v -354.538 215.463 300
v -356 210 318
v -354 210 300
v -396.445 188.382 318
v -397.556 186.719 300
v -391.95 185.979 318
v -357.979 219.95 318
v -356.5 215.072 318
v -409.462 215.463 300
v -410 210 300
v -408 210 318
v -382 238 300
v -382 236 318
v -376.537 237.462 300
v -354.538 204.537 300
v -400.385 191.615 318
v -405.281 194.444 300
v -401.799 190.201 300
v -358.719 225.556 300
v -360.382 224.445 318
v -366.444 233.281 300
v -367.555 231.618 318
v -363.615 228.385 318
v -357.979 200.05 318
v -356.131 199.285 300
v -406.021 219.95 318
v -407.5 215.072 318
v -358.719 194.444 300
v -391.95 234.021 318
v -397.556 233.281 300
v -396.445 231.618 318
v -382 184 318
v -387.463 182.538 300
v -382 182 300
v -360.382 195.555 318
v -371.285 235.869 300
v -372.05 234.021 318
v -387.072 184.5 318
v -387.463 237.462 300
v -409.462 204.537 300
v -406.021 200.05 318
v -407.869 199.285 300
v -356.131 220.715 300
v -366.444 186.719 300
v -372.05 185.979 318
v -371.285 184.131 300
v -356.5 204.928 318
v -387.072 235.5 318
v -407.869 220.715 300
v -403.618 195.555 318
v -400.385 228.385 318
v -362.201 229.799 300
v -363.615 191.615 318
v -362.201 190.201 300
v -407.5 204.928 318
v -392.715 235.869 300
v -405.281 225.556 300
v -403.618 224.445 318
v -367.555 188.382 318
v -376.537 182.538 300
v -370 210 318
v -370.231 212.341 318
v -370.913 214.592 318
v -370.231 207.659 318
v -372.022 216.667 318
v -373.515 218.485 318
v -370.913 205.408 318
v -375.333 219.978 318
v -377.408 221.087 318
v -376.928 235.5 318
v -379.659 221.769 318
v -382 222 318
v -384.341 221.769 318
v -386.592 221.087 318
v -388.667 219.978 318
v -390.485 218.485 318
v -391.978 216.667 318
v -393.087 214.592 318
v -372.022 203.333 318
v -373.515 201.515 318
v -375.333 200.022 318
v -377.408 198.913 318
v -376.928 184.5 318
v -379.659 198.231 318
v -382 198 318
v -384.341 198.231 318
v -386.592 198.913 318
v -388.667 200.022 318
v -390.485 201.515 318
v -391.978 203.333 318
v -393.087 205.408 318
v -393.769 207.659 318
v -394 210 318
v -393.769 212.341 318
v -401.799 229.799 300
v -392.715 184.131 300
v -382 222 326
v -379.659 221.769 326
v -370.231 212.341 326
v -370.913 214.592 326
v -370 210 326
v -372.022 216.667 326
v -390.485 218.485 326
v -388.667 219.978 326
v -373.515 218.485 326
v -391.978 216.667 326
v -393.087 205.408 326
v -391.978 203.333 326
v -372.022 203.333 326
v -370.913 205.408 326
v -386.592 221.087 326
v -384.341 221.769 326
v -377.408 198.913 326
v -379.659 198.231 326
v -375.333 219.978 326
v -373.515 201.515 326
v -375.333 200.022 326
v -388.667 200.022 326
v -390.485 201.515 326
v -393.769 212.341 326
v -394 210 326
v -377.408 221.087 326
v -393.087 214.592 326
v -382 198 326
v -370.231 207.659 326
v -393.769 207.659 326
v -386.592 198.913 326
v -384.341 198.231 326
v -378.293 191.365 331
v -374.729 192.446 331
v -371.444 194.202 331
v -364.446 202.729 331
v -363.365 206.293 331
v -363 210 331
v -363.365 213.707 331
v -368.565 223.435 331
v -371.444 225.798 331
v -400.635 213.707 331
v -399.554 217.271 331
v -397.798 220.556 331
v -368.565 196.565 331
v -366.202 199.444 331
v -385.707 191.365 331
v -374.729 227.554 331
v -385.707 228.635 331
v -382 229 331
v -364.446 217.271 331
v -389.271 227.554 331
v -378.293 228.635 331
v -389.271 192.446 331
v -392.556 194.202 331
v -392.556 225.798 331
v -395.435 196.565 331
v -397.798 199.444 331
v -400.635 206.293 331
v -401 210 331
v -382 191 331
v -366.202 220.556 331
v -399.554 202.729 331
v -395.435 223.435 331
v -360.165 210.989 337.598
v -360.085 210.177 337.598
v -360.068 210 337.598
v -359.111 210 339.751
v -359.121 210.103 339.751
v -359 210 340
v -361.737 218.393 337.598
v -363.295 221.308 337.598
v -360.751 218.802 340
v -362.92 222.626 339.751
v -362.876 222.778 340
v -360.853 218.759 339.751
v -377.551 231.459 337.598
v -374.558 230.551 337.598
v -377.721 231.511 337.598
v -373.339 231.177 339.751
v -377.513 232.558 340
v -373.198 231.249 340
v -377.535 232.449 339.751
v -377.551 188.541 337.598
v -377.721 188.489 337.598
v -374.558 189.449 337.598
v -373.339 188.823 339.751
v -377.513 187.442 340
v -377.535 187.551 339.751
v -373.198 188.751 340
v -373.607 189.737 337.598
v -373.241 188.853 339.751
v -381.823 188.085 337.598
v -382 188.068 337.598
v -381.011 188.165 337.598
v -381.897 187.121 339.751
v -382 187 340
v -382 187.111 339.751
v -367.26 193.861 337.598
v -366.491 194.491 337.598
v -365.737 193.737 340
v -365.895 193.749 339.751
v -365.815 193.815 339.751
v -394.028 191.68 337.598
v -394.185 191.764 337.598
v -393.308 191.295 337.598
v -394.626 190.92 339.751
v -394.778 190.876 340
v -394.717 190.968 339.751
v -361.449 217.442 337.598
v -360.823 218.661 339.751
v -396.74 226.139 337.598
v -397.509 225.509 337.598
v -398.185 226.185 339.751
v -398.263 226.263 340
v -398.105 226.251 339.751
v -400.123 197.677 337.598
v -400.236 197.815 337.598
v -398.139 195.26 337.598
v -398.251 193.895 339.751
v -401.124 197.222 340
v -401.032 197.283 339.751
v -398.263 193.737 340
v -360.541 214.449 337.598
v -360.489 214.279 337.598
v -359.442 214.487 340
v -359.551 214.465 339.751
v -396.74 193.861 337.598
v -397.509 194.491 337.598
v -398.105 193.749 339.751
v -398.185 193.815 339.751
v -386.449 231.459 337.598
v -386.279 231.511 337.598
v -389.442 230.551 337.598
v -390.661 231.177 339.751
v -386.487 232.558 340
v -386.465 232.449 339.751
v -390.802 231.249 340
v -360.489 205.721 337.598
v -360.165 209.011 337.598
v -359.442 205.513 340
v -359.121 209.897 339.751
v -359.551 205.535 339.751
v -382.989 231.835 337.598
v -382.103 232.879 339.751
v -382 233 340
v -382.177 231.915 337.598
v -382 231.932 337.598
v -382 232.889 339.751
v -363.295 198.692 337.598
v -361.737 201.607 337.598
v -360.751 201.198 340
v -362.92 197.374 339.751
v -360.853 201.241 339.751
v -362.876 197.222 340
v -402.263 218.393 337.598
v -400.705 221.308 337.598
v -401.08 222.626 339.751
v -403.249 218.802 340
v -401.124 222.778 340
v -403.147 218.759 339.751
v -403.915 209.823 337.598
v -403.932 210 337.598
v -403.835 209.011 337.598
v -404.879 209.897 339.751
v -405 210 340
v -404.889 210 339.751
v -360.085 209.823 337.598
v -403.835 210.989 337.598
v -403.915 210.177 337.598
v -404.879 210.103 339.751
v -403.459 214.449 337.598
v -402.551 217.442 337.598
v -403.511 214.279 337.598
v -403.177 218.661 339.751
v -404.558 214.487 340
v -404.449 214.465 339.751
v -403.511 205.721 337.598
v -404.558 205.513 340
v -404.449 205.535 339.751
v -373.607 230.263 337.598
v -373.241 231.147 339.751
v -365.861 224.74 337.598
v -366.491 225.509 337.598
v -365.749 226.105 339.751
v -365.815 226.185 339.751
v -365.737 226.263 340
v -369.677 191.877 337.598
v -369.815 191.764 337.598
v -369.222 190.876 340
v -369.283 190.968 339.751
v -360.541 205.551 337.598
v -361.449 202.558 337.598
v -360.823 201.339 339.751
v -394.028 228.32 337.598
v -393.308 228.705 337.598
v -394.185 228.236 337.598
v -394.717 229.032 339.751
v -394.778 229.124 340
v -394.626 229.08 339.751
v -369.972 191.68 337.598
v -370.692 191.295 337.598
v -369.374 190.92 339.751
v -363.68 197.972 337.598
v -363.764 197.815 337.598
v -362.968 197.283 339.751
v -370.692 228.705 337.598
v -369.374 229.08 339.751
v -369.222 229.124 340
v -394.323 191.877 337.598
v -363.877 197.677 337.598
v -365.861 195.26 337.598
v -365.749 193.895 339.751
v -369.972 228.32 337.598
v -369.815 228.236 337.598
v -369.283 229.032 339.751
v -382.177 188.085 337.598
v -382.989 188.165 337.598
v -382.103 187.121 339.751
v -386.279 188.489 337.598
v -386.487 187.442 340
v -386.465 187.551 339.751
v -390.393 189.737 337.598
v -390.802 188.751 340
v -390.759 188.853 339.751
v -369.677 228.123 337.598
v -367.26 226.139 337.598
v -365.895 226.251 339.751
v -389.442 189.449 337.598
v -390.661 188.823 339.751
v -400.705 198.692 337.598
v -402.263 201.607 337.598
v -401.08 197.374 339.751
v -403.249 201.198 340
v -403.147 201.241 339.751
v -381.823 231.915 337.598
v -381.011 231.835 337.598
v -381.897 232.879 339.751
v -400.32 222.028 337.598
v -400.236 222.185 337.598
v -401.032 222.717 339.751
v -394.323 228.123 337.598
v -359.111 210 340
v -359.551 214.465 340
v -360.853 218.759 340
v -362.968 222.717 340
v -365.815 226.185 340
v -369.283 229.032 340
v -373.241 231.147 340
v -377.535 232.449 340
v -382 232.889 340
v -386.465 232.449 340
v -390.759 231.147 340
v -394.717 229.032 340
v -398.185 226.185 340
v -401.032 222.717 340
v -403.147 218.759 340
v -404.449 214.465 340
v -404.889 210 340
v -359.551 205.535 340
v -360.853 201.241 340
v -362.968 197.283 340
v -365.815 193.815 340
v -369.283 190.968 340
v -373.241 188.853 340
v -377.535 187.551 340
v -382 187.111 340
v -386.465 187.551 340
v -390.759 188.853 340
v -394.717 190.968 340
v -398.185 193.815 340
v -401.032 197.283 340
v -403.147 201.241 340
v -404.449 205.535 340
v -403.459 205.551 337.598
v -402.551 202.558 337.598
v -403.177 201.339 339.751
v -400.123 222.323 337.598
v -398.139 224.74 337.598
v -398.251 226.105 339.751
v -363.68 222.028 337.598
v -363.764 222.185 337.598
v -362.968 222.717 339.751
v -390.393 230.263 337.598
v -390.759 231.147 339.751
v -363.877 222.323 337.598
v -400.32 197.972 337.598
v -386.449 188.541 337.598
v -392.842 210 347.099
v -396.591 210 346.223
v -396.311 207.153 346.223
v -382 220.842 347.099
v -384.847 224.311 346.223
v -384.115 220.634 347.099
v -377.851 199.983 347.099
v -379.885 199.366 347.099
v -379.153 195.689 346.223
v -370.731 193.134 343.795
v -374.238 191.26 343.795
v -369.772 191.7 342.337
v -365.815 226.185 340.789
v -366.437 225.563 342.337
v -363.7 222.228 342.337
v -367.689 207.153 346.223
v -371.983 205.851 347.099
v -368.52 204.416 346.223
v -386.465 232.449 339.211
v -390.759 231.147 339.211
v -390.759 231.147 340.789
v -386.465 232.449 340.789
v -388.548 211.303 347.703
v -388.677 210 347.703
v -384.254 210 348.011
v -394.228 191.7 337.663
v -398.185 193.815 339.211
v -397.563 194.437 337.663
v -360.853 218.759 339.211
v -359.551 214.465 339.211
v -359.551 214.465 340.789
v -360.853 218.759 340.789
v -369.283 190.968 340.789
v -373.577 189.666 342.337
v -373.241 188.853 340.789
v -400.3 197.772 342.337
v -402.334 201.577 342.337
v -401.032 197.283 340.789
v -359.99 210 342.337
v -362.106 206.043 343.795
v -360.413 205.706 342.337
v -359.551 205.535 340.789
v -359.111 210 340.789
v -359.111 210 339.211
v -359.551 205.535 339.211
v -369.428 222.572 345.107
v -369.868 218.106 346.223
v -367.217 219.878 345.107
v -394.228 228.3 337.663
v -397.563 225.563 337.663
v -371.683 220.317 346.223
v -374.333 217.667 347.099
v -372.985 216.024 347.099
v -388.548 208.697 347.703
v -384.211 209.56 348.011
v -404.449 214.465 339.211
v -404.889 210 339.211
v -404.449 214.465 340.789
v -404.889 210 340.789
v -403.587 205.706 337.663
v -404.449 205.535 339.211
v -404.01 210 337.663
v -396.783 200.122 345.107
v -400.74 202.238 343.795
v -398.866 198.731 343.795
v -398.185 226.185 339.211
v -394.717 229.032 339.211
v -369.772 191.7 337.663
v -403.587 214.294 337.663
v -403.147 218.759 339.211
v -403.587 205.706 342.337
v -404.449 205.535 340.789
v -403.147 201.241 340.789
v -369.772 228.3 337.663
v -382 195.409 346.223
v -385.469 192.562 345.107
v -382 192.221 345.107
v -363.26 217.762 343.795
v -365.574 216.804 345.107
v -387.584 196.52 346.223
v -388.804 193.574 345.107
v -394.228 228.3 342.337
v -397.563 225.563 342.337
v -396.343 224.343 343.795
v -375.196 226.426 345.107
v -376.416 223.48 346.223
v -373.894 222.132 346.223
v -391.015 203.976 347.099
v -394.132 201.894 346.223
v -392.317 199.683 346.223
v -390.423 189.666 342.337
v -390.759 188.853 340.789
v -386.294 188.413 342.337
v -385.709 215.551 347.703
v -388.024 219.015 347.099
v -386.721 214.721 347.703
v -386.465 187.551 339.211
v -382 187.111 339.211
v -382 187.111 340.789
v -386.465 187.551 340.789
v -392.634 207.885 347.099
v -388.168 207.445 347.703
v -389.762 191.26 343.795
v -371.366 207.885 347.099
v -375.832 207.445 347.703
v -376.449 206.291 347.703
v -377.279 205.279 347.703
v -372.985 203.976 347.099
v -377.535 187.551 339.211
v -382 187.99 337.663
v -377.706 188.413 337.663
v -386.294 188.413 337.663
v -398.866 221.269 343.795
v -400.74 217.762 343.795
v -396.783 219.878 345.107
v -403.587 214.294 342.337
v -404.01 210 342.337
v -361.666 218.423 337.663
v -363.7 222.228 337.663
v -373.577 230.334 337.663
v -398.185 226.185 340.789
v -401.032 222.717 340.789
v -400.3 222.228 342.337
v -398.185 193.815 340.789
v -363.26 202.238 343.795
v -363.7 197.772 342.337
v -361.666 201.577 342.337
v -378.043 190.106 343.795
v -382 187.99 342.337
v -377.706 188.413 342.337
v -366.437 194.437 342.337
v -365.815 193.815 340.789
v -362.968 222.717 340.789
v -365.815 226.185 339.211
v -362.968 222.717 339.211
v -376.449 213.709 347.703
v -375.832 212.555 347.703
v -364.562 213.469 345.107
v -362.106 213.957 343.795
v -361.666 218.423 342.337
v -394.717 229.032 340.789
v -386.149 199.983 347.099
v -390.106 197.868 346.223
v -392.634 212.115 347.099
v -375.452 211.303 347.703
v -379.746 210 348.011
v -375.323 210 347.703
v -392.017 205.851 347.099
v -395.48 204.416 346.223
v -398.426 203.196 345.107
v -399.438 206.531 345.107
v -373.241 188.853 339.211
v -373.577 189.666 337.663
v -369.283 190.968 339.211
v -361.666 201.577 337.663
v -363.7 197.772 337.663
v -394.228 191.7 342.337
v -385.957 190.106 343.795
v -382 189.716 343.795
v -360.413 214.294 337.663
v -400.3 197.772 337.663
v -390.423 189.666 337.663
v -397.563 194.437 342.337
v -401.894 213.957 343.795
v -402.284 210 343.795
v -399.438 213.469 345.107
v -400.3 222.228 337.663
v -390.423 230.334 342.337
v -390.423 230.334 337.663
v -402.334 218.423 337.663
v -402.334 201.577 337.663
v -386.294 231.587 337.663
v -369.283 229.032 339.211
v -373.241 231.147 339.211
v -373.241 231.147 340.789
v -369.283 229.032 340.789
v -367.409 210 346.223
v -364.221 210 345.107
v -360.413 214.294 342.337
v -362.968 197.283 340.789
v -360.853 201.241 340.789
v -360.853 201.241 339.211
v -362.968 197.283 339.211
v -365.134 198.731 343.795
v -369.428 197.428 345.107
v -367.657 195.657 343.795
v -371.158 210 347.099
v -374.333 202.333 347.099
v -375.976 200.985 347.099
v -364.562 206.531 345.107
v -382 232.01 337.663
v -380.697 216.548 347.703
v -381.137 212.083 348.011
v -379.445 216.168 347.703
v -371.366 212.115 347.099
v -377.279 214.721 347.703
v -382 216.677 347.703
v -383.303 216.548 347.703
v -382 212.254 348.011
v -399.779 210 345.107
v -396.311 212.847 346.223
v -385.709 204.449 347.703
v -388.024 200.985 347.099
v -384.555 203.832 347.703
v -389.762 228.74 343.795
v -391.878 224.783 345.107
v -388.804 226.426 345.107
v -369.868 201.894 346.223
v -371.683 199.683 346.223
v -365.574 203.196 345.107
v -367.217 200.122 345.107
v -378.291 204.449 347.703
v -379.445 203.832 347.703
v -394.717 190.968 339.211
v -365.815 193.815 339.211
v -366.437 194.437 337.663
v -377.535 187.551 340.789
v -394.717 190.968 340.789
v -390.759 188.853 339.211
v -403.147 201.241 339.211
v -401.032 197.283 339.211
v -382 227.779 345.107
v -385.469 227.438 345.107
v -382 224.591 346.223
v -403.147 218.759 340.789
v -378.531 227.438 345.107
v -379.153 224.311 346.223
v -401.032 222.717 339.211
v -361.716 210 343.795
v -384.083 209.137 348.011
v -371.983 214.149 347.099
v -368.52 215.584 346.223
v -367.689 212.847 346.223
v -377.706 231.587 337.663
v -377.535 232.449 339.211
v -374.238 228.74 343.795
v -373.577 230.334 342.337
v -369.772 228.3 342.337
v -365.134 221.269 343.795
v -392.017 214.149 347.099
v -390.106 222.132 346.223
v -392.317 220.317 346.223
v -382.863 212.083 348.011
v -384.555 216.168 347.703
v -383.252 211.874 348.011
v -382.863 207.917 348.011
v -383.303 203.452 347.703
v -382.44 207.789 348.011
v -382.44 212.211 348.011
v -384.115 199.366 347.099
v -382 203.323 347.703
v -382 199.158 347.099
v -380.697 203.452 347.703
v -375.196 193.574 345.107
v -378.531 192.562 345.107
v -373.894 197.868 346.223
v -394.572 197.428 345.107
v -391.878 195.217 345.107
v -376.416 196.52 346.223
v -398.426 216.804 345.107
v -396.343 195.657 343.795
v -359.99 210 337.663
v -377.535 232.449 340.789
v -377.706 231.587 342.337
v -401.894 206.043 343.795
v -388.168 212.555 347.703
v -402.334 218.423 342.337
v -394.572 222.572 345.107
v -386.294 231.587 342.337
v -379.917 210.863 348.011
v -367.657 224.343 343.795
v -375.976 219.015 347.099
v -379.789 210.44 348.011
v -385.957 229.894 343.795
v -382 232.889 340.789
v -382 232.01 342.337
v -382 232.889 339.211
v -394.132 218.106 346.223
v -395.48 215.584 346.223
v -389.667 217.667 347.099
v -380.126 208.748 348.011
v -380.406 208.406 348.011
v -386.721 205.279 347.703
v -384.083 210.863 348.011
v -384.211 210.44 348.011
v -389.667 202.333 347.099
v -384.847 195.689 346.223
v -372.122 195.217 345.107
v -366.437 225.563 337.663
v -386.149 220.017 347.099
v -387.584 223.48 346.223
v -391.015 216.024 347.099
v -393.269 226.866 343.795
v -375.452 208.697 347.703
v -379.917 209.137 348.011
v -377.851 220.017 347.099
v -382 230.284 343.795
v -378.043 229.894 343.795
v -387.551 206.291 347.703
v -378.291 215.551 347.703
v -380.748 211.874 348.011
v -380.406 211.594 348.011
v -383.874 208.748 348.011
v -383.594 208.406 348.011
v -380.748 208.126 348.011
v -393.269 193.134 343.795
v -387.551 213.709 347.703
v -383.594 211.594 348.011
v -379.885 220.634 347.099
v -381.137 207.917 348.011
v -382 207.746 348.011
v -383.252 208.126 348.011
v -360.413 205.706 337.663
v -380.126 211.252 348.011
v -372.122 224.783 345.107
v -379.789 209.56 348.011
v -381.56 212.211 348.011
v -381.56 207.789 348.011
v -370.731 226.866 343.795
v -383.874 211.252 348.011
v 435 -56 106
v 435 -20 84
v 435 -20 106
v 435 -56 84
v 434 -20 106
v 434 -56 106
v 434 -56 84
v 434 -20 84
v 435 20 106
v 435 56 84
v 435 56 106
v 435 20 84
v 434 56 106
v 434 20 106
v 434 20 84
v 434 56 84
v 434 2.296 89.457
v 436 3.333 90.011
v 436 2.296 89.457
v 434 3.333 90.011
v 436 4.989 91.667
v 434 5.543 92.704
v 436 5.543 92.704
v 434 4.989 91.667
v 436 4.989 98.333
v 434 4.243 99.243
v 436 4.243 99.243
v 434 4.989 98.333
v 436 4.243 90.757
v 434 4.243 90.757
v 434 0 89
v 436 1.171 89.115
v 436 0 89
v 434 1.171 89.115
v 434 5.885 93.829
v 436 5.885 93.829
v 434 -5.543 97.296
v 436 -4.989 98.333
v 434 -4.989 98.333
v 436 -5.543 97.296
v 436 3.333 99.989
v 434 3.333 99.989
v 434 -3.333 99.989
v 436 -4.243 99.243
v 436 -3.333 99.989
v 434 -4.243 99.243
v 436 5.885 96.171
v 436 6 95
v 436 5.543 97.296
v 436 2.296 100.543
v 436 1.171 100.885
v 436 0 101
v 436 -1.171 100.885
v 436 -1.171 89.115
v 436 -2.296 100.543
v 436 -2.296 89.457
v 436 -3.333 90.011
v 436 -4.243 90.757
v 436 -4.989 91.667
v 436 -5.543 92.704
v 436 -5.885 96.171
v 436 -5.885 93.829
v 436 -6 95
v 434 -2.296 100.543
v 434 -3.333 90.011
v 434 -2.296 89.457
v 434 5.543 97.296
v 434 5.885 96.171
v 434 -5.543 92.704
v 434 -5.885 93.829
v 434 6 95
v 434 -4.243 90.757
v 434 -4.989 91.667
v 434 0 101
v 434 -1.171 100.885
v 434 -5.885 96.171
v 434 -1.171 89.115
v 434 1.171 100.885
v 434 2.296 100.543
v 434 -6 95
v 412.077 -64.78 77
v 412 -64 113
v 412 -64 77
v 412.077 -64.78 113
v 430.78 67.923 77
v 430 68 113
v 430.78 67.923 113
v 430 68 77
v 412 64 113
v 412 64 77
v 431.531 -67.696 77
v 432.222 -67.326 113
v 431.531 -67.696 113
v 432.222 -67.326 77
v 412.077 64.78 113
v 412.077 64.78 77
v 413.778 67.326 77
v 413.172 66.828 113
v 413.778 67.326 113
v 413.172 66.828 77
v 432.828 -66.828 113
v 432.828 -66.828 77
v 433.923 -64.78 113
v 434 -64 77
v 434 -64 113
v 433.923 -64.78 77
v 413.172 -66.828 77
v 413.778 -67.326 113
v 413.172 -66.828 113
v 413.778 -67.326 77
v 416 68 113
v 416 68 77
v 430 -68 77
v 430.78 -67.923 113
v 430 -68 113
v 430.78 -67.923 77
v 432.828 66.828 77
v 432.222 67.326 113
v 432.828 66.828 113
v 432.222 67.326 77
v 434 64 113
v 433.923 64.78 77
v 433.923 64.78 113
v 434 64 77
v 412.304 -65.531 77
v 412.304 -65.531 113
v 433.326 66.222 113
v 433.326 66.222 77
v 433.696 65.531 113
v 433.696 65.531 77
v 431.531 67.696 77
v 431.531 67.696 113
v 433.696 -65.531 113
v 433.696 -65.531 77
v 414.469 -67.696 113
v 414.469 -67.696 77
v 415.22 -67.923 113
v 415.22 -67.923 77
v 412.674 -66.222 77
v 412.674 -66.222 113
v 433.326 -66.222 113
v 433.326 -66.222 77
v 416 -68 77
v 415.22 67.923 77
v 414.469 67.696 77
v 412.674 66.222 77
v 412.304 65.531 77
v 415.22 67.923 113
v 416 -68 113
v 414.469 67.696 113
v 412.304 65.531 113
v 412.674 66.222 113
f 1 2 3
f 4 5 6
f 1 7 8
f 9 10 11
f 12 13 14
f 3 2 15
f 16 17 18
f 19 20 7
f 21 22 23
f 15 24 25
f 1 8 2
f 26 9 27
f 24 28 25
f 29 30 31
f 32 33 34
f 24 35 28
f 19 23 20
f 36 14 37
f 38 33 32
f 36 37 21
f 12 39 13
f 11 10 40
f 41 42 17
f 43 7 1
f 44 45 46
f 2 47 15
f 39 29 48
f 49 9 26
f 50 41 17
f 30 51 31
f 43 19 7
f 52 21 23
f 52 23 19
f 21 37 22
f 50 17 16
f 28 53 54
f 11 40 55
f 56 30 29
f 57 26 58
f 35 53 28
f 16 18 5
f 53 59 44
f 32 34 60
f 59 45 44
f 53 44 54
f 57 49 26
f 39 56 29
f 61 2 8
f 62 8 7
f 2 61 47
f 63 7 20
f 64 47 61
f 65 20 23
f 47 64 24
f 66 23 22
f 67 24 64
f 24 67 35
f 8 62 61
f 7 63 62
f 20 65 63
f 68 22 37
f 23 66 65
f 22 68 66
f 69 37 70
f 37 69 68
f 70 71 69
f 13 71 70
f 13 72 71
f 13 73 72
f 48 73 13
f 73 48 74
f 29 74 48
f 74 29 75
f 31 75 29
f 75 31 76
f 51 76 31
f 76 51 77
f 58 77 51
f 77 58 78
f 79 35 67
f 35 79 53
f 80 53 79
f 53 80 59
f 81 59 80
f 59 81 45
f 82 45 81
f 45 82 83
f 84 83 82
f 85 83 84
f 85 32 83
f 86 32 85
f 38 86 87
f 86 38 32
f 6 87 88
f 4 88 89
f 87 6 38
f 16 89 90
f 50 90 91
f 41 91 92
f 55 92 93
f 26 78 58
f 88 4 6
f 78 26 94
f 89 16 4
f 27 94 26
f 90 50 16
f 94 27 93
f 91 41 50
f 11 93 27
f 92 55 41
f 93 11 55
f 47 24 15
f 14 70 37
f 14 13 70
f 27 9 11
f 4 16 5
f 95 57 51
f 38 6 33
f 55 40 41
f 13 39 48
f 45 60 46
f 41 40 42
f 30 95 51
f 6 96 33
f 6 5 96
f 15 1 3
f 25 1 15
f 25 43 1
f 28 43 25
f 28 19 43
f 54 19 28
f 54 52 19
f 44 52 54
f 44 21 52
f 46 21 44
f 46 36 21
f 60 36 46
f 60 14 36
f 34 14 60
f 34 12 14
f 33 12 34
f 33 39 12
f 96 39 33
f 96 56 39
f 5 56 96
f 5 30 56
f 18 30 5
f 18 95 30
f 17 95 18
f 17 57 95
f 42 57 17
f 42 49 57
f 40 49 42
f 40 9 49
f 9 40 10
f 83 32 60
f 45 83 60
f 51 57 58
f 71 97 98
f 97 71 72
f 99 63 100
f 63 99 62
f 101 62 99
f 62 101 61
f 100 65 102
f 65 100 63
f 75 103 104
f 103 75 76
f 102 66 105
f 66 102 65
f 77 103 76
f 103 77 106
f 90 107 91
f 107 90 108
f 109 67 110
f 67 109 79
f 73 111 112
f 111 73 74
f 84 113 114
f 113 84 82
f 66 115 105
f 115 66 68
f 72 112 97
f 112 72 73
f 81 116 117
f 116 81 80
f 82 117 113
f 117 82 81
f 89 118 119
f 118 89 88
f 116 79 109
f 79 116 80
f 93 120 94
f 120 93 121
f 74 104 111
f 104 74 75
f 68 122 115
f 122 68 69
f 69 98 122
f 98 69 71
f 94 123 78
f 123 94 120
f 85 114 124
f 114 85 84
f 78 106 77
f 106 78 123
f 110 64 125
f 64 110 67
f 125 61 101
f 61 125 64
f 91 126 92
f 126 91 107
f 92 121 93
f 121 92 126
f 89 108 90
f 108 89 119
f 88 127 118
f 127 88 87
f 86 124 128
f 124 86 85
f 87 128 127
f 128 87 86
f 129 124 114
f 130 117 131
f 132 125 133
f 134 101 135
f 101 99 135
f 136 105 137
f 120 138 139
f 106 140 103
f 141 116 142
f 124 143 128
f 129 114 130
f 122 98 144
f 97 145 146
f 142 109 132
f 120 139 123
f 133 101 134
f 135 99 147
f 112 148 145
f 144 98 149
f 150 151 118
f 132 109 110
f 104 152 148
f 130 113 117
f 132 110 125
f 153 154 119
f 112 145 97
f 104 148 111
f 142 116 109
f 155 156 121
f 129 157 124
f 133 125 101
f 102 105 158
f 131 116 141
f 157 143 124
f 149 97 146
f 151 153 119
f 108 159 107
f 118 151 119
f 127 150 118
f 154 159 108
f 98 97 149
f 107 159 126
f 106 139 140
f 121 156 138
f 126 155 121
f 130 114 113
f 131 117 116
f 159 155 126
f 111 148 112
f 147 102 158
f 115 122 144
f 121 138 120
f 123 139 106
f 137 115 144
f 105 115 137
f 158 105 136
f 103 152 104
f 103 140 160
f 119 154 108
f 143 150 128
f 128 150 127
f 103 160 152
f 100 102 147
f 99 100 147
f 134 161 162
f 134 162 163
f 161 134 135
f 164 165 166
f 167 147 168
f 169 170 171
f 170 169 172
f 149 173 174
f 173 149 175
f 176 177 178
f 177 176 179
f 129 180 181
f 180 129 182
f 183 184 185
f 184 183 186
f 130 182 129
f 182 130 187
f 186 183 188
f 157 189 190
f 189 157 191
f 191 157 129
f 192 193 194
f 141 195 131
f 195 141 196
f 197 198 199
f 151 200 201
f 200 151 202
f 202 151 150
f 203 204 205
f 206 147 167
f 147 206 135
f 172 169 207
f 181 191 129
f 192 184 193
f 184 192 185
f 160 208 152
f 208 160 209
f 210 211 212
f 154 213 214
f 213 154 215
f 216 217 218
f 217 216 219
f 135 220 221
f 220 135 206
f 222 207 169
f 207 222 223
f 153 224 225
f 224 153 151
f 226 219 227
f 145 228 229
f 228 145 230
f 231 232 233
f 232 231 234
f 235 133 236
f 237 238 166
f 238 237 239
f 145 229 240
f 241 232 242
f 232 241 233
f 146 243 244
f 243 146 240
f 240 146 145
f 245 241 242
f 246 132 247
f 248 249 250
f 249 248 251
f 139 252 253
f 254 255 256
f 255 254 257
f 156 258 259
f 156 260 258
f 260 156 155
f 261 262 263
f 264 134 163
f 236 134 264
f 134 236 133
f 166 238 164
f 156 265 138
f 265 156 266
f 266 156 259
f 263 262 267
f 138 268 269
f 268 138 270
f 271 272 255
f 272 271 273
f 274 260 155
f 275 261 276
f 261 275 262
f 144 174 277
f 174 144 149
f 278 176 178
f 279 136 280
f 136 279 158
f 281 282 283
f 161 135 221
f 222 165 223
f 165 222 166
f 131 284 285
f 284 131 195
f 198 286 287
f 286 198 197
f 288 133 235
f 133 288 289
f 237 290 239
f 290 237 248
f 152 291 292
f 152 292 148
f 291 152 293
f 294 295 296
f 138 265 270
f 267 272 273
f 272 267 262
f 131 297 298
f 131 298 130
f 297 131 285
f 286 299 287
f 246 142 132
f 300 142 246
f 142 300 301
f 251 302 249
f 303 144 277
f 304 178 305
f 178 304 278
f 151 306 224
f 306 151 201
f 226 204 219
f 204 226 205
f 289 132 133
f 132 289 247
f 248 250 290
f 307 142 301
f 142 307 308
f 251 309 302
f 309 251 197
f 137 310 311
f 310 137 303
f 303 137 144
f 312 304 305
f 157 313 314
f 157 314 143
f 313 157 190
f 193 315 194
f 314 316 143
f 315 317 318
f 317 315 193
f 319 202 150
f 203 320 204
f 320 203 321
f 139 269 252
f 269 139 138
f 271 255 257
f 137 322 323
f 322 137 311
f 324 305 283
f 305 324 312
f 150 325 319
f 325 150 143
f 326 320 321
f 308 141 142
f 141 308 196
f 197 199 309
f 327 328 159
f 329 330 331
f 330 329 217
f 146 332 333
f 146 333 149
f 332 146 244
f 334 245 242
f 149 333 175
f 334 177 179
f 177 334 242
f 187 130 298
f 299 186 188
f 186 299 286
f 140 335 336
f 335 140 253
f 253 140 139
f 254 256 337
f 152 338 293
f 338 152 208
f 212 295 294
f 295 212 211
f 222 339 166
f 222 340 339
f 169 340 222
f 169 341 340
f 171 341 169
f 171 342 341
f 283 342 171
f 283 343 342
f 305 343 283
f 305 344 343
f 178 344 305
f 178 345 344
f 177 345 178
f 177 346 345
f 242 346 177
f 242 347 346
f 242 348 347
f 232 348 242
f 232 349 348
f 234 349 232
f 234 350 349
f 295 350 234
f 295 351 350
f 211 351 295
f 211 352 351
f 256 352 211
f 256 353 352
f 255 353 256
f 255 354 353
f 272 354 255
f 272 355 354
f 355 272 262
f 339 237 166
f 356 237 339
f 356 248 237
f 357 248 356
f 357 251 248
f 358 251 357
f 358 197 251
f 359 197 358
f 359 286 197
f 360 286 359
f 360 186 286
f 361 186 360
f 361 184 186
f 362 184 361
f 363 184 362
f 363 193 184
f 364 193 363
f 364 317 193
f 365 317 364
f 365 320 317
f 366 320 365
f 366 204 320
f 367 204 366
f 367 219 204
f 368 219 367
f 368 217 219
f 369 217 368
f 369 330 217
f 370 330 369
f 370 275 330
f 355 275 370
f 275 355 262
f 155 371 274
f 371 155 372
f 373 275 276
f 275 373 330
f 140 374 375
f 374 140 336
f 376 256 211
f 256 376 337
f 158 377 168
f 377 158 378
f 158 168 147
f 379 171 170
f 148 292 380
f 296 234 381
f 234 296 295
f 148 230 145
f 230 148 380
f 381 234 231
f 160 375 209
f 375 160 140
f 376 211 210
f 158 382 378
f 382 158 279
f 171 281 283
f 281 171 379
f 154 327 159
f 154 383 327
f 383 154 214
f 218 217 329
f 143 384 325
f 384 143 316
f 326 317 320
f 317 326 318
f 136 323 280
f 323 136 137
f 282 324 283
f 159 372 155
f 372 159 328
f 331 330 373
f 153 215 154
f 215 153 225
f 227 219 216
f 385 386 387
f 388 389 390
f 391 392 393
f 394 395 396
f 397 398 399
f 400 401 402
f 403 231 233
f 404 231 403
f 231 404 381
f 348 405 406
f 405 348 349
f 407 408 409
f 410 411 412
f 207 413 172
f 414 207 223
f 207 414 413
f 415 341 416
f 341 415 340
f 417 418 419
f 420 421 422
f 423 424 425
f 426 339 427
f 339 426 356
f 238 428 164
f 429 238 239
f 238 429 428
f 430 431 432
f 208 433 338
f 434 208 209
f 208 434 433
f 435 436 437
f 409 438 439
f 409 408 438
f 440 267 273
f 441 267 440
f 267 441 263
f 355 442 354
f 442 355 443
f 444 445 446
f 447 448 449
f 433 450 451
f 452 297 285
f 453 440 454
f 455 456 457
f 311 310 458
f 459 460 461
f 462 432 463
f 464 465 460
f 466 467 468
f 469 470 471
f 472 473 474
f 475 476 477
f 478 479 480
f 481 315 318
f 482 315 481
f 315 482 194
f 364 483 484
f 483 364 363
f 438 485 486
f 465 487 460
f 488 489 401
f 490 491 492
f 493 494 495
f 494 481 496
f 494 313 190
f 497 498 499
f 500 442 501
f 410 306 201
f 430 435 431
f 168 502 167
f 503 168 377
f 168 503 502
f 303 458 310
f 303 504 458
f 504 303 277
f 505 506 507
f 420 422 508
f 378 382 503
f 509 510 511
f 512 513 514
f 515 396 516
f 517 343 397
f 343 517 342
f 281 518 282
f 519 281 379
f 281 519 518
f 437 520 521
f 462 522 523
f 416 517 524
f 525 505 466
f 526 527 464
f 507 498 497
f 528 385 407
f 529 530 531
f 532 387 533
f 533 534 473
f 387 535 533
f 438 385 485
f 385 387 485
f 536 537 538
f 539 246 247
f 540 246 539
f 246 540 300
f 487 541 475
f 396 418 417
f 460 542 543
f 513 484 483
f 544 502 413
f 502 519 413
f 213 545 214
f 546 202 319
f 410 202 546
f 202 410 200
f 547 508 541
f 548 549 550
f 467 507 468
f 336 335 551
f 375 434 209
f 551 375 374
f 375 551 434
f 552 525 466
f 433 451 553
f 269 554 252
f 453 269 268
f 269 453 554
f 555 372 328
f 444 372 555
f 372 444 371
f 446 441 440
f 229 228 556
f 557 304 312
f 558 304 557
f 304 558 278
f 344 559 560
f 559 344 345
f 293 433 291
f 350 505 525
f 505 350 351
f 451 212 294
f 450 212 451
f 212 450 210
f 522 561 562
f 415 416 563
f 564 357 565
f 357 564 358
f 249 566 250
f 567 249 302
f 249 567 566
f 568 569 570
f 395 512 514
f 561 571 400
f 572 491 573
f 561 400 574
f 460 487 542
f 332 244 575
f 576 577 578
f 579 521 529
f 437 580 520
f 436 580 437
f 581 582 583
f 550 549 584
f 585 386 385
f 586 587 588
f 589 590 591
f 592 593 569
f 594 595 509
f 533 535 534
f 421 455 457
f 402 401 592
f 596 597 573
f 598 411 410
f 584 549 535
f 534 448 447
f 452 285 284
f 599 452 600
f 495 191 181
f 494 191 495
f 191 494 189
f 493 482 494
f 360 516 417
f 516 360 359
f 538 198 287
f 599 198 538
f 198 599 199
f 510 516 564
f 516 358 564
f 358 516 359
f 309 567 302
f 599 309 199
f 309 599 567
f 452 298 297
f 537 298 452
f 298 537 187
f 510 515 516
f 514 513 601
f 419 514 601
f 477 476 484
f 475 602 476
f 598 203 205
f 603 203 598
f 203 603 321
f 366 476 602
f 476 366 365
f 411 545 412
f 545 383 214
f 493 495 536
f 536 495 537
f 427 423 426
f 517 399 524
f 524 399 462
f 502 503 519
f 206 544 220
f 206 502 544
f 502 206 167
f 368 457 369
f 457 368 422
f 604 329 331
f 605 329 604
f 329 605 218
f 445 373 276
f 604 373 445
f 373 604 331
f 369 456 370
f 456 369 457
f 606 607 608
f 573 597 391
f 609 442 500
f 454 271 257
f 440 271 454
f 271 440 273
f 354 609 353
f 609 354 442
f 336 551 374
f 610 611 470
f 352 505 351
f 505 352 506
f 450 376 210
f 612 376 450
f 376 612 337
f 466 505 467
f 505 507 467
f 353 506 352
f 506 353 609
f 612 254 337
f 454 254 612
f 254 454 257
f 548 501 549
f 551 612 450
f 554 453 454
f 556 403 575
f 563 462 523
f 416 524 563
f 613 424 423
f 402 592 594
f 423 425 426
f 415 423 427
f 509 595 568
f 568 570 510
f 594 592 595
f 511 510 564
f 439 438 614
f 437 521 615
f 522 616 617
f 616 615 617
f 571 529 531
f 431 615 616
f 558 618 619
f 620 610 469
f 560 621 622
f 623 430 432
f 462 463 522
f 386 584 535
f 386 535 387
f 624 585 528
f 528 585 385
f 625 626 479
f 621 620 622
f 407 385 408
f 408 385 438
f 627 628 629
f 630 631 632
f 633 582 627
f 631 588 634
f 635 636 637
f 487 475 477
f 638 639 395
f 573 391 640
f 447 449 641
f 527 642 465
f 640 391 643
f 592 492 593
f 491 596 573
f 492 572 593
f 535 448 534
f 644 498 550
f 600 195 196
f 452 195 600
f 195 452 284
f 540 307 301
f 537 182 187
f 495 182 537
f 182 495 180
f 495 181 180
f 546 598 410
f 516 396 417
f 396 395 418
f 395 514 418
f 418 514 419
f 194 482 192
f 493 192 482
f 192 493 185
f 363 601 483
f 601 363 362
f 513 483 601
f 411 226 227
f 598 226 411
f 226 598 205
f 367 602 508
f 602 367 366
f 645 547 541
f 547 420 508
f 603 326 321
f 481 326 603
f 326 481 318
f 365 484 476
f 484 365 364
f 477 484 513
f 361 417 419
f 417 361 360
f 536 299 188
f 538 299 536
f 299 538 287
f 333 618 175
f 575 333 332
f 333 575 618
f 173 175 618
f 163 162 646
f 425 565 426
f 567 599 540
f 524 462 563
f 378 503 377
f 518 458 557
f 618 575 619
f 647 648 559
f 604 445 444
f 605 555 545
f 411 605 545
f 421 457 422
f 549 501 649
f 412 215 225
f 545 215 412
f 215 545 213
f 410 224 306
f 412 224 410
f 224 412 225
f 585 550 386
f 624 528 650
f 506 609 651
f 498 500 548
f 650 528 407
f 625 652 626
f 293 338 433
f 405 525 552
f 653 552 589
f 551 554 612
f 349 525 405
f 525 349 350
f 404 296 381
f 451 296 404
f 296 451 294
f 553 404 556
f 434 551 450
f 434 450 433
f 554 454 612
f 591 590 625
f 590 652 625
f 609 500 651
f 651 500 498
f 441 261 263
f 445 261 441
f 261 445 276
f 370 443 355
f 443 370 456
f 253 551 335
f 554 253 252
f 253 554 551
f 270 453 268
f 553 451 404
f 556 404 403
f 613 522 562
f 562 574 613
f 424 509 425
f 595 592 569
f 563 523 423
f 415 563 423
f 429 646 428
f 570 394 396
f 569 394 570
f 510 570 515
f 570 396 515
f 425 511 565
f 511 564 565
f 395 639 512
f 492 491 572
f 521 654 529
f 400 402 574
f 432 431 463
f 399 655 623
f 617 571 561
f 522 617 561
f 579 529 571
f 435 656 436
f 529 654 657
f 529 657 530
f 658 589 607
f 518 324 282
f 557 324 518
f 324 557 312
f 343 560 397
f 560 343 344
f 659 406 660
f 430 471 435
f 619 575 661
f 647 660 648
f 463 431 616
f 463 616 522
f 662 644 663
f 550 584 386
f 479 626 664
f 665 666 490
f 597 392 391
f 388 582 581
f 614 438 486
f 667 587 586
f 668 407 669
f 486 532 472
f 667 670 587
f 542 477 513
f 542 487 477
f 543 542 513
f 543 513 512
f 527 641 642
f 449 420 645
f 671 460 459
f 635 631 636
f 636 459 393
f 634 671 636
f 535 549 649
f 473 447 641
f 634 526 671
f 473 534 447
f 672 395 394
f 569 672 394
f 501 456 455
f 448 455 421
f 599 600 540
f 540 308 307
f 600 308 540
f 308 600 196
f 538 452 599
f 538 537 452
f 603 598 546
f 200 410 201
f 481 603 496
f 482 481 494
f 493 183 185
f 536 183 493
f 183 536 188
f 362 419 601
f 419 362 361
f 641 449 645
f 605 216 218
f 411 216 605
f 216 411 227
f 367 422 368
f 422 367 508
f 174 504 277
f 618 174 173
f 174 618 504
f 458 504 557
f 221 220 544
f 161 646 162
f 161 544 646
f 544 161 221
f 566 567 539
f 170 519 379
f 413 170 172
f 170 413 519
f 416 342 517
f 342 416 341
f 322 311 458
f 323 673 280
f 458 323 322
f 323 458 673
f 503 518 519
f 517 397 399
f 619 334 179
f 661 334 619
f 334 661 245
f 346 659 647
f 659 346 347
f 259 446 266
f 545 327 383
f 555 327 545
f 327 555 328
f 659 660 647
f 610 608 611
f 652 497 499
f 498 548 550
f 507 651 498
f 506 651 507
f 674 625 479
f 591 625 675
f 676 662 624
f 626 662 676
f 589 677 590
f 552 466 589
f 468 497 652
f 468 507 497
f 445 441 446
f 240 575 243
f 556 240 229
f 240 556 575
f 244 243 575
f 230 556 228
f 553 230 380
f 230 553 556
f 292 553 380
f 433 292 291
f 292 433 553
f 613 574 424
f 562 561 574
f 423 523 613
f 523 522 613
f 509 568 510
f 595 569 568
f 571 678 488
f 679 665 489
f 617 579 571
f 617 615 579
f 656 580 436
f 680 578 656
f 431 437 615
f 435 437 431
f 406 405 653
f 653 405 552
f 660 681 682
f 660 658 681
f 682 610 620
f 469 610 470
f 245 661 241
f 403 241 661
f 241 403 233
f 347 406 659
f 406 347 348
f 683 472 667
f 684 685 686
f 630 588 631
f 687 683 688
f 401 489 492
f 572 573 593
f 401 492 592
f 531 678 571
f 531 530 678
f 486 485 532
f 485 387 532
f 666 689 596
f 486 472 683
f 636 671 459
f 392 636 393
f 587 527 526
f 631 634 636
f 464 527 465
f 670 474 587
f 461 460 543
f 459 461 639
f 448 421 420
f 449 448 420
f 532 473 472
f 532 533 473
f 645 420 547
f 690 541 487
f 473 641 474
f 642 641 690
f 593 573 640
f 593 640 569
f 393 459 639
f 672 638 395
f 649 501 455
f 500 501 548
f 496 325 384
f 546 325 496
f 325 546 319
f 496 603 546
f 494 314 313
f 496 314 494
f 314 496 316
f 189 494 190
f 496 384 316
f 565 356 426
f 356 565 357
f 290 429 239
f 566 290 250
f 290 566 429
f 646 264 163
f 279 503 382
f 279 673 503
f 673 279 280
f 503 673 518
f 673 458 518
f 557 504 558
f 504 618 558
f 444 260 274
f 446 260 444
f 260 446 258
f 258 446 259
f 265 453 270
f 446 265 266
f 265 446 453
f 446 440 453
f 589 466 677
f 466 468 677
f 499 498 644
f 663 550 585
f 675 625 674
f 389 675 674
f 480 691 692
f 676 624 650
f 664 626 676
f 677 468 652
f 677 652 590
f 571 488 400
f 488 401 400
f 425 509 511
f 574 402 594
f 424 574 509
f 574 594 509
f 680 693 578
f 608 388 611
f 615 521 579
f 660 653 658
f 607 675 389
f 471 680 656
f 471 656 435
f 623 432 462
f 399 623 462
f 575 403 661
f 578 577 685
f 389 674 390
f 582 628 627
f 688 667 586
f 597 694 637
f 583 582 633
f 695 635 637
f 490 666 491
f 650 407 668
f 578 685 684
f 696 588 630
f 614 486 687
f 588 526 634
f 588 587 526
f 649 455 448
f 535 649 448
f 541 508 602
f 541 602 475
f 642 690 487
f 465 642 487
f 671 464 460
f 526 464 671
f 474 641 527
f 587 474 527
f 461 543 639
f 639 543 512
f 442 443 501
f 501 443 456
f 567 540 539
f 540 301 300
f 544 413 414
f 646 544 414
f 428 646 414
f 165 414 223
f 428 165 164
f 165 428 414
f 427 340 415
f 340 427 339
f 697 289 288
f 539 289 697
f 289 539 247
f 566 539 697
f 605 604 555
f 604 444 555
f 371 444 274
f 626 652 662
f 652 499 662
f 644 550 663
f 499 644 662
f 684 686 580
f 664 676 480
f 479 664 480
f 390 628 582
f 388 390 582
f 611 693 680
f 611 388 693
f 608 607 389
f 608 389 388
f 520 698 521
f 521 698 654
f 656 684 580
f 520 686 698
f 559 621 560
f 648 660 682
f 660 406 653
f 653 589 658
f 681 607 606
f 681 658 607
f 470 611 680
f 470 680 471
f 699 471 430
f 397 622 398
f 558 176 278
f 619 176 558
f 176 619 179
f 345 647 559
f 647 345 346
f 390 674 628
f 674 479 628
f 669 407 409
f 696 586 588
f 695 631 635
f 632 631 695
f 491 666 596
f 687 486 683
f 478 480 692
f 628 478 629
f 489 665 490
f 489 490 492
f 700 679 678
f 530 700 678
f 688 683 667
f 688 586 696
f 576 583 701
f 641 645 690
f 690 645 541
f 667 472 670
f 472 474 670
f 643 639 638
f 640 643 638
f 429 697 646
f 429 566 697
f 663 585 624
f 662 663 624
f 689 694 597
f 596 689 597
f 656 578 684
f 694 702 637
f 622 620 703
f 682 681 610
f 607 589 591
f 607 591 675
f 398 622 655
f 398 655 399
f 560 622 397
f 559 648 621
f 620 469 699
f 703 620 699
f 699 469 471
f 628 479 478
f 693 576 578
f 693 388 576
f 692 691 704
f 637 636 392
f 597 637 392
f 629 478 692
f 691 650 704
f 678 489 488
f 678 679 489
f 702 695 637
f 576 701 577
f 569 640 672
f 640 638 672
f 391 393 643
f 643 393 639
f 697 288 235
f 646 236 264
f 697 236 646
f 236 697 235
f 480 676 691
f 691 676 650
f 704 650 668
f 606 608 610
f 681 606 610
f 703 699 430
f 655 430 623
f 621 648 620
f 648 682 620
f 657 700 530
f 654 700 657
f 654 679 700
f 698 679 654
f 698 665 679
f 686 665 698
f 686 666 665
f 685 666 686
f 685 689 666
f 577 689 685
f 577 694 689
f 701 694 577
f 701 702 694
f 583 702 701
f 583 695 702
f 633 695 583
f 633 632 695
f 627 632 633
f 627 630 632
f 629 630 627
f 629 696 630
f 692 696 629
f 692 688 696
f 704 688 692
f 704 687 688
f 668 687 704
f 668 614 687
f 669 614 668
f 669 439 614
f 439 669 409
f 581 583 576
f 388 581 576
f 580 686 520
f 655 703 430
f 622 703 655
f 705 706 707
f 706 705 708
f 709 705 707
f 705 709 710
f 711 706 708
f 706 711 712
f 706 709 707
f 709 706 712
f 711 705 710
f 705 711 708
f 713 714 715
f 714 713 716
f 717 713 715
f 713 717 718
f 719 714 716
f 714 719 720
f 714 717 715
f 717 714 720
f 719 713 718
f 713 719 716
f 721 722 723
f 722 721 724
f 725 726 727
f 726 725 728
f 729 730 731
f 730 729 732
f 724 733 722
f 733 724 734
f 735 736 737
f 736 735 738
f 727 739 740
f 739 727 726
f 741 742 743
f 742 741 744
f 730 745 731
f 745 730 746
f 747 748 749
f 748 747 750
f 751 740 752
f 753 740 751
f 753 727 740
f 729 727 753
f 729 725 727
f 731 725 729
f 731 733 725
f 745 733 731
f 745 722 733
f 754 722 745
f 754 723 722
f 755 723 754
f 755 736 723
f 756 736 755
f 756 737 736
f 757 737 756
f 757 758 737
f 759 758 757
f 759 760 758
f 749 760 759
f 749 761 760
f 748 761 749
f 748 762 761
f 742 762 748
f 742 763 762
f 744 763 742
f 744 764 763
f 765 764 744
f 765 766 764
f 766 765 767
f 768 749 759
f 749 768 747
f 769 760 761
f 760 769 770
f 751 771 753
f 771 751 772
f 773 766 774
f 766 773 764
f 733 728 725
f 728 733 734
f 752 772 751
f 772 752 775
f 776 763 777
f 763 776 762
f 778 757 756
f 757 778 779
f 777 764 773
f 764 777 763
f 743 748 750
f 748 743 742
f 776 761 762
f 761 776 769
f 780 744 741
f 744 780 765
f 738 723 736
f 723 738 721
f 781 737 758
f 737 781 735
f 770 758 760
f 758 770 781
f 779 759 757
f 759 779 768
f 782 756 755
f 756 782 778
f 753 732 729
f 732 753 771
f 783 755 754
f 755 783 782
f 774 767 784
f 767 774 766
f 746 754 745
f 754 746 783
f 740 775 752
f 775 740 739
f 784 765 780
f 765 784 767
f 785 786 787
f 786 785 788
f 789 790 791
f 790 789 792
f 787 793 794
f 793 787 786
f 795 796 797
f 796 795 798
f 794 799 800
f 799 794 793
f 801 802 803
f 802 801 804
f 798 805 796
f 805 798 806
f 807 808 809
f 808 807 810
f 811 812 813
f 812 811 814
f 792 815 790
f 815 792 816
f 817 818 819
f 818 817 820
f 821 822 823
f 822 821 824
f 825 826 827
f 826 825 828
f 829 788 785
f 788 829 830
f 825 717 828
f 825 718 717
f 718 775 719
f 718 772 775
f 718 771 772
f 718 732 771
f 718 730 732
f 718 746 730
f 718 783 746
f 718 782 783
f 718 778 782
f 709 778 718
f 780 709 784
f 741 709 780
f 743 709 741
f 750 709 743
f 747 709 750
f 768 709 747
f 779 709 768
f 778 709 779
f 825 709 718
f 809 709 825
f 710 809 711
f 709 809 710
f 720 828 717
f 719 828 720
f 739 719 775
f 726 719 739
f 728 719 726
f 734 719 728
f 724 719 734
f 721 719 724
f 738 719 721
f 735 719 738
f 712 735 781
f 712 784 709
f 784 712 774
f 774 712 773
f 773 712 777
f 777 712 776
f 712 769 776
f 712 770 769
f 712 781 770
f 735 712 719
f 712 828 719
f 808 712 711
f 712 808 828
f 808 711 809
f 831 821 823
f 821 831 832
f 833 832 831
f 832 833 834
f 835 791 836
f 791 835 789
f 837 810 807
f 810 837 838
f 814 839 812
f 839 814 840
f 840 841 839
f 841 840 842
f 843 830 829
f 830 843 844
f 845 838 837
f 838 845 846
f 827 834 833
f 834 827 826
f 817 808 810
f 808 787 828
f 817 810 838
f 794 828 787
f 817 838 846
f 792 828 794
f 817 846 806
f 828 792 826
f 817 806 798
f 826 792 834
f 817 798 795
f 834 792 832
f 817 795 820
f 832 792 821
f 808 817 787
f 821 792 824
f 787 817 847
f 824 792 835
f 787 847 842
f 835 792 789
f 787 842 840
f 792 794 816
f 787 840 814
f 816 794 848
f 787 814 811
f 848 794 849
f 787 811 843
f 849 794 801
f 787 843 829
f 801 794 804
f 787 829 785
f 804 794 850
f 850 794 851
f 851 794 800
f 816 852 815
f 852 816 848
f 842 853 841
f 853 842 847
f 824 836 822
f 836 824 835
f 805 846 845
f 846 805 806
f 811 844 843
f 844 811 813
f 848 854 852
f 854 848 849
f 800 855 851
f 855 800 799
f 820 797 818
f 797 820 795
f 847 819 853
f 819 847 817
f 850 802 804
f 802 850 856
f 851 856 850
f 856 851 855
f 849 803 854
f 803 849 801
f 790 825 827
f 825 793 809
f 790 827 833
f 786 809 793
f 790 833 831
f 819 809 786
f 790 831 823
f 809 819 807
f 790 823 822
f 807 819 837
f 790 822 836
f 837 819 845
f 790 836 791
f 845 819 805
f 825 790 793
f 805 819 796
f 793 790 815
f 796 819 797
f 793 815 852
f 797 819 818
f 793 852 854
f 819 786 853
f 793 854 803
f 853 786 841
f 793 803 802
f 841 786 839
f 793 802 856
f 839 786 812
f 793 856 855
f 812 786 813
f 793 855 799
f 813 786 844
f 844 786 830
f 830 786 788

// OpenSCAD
// ============================================================================
// FILE: export_safety_components.scad
// OUTPUT: safety_components_visual.stl
// URDF LINK: safety_components_link
// ============================================================================

export_only = true;

include <main.scad>

union() {
    emergency_stop();
    charging_contacts();
}
